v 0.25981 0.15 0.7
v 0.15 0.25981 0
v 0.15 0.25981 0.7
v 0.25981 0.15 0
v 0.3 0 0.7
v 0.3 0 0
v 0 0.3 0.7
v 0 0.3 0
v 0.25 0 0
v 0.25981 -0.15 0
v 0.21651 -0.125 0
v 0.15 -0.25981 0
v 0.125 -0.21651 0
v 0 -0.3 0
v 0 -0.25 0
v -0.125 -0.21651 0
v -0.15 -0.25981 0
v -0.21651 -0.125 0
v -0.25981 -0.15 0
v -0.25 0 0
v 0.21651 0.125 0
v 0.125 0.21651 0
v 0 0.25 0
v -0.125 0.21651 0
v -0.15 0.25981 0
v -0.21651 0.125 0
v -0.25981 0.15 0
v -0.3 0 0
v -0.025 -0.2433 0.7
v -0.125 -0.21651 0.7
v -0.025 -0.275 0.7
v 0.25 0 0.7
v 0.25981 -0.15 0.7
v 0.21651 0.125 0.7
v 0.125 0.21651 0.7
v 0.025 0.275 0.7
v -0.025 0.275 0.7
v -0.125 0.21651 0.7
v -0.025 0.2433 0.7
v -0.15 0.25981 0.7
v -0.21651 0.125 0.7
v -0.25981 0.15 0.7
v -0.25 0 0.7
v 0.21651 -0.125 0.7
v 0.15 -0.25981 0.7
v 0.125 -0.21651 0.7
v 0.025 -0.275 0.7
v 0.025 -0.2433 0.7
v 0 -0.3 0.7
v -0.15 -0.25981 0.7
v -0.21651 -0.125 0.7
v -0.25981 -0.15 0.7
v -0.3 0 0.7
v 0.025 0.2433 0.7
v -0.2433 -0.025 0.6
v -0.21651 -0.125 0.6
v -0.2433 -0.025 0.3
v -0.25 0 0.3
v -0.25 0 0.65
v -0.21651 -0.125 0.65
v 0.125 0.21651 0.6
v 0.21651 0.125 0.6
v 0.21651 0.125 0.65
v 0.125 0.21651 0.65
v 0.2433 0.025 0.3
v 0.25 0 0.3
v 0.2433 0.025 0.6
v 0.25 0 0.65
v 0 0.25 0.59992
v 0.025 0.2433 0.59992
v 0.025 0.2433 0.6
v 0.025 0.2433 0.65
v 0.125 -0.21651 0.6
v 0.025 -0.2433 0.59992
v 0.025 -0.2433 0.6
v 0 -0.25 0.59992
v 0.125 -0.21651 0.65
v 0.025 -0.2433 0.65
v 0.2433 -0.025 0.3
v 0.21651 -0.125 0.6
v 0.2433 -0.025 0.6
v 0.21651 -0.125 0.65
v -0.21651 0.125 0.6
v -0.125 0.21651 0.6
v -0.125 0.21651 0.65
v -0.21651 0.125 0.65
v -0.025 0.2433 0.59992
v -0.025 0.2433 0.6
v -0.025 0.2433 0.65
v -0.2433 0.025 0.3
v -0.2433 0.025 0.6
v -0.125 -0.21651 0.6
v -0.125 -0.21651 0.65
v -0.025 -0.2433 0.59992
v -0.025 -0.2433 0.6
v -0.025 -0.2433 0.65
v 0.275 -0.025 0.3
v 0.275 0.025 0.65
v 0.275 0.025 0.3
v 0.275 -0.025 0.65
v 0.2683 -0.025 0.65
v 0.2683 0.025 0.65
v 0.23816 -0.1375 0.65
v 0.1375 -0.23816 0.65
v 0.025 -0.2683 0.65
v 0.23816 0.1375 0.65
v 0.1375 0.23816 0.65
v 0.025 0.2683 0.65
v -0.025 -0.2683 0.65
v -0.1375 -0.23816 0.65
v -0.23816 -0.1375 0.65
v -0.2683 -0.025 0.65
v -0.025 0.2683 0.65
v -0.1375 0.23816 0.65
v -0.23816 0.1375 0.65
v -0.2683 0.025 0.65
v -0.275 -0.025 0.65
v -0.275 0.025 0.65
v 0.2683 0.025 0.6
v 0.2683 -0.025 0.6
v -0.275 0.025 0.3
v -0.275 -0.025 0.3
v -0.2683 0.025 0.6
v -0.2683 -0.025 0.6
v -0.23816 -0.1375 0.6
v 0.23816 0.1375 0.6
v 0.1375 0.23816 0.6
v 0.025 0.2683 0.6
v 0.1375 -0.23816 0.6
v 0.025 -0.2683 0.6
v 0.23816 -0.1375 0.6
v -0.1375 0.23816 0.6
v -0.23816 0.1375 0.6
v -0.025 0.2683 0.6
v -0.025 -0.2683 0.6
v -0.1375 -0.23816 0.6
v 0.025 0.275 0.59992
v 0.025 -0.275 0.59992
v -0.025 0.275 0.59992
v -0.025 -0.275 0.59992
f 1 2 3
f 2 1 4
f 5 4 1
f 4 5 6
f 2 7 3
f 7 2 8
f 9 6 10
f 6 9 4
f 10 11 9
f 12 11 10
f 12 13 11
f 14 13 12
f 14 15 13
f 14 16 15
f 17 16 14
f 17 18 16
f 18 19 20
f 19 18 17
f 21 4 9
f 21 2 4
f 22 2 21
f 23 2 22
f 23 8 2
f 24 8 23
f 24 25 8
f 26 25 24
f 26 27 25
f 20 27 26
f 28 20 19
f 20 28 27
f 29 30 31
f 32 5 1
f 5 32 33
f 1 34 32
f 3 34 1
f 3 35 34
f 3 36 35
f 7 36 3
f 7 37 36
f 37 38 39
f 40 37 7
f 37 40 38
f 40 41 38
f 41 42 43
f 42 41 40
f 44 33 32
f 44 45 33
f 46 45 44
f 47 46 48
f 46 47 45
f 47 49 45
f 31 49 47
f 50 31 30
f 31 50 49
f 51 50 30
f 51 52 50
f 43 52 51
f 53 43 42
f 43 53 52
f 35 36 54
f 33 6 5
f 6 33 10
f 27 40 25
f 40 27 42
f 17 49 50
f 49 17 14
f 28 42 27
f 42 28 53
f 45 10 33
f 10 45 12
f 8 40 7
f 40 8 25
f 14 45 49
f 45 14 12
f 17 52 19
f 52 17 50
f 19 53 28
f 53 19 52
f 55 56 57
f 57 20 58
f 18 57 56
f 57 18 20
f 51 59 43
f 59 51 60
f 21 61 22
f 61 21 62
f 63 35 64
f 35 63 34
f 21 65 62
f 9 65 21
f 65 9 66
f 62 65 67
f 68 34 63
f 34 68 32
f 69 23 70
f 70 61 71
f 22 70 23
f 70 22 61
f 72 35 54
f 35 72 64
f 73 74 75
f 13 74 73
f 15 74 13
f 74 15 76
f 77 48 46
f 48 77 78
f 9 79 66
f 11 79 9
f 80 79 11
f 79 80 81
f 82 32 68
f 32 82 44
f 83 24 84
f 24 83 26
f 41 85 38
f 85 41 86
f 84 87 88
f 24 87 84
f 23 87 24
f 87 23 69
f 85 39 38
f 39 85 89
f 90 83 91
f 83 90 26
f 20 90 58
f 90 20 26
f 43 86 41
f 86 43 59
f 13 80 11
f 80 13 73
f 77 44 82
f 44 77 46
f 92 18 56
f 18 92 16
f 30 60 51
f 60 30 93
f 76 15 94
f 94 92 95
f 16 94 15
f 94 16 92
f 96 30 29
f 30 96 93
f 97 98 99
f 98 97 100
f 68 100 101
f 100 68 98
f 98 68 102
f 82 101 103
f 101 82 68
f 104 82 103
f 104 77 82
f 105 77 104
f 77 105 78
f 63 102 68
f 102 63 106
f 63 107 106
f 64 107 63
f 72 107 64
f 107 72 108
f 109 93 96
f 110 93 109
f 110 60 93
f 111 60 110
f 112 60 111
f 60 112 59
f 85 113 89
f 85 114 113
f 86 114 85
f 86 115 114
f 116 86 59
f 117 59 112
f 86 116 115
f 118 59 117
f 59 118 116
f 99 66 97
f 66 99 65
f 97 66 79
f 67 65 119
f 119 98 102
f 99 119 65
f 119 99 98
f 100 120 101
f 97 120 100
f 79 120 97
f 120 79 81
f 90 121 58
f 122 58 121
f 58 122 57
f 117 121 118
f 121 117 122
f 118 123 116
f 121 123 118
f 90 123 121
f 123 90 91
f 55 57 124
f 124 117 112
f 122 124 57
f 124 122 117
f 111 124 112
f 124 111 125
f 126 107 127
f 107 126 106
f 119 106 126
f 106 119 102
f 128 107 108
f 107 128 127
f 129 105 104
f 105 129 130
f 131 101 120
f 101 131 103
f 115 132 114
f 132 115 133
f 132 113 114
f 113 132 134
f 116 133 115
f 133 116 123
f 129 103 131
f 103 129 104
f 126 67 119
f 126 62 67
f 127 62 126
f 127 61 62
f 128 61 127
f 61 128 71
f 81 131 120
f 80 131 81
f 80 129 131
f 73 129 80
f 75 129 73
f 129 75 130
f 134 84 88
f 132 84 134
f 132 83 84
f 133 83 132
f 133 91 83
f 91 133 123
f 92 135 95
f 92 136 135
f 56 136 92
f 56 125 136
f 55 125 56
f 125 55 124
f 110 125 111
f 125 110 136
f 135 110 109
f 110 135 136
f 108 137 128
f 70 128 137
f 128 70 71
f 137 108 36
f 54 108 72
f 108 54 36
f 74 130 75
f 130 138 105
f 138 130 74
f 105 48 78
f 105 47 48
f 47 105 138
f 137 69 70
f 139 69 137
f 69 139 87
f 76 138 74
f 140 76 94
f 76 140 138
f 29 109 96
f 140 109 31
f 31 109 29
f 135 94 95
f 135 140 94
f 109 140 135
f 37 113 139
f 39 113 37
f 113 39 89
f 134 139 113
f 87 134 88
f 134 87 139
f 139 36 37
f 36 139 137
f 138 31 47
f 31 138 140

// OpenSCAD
tolerance = 0.015;
hole_radius = 0.045;
grid_hole_radius = 0.03;
outer_radius = 0.3;
thickness = 0.05;
hole_attach_height = 0.02;
compressed_height = 0.7;
extended_height = 1;
next_hole_radius = 0.045;
next_hole_attach_height = 0.02;
next_inner = 0.2;
hole_twist = 0;

//other params
eps = tolerance/100;
rail_attach_height = grid_hole_radius + hole_attach_height;
inner_radius = outer_radius - thickness;
rail_attach_width = rail_attach_height;
fn = 12;
fnh = 6;

module angled_cylinder(angle_deg_y, _h, _r, angle_deg_x = 0) {
    rotate([angle_deg_x, angle_deg_y, 0]) { // Rotate the cylinder 
            cylinder(h = _h, r = _r, center = true, $fn = fnh);
        }
}

module hole(_h) {
    cylinder(h = _h, r = grid_hole_radius, $fn = fnh);
}

//makes circle of holes
module circular_grid(_h, _r, _n) {
    for (i = [0:_n-1]) {
        angle = i * 360 / _n;
        x_pos = _r * cos(angle);
        y_pos = _r * sin(angle);
        translate([x_pos, y_pos, -eps]) {
            hole(_h);
        }
    }
}

//makes grid of holes
module hole_grid(hole_height, grid_h) {
    translate([0,0,hole_height]) {
        difference() {
            //cylinder
            cylinder(h = grid_h, r = (inner_radius + outer_radius)/2, 
                center=false, $fn = fn);
            //holes
            for (i = [0 : grid_hole_radius * 2 + hole_attach_height : inner_radius - grid_hole_radius * 2]) {
                circular_grid(grid_h + eps*2, i, ceil(6.28*i/(grid_hole_radius*4)));
            }
            
        } 
    }
}

module bottom_joint() {
    out_hole_angle = 60;

    //grid of holes
    //hole_grid(hole_radius*2 + hole_attach_height * 2, grid_hole_radius);
   
    difference() {
        //outer cylinder
        cylinder(h=compressed_height, r= outer_radius, $fn = fn);
        
        //shell
        translate([0,0,-eps/2])
        cylinder(h=compressed_height + eps, r= inner_radius, $fn = fn);
        
        //screw holes
//        translate([0,0,hole_attach_height + hole_radius]) 
//        rotate([0,0,hole_twist]){
//            rotate([90,0,0])
//            cylinder(h=outer_radius*2 + eps,r=hole_radius,$fn=fnh,center=true);
//            rotate([0,90,0])
//            cylinder(h=outer_radius*2 + eps,r=hole_radius,$fn=fnh,center=true);
//            
//            
//        }
        
        //space between guide holes and grid
        guide_hole_space = grid_hole_radius;
        //guide holes
//        translate([-grid_hole_radius*cos(out_hole_angle) + inner_radius,0,hole_attach_height*2 + hole_radius*2 + grid_hole_radius + grid_hole_radius*sin(out_hole_angle) + guide_hole_space])
//                rotate([0,out_hole_angle,0])
//                cylinder(h=thickness/sin(out_hole_angle) + grid_hole_radius*2/tan(out_hole_angle), r=grid_hole_radius, $fn = fnh);
//        
//        translate([grid_hole_radius*cos(out_hole_angle) - inner_radius,0,hole_attach_height*2 + hole_radius*2 + grid_hole_radius + grid_hole_radius*sin(out_hole_angle) + guide_hole_space])
//                rotate([0,-out_hole_angle,0])
//                cylinder(h=thickness/sin(out_hole_angle) + grid_hole_radius*2/tan(out_hole_angle), r=grid_hole_radius, $fn = fnh);
        
        //for future reference of minimum joint size
        guide_height = hole_attach_height*2 + hole_radius*2 + grid_hole_radius + grid_hole_radius*2/sin(out_hole_angle) + thickness/tan(out_hole_angle) + guide_hole_space;
        
        //track
        rail_height = rail_attach_height + extended_height - compressed_height;
        translate([inner_radius,0,compressed_height - rail_height/2 - rail_attach_height])
            cube([thickness,rail_attach_width,rail_height],center = true);
        
        translate([-inner_radius,0,compressed_height - rail_height/2 - rail_attach_height])
            cube([thickness,rail_attach_width,rail_height],center = true);
        
        translate([0,0,compressed_height - rail_attach_height*2])
        cylinder(h=rail_attach_height,r=inner_radius + thickness/2,$fn=fn);
        
        //insert to track
        translate([0,0,compressed_height - rail_attach_height])
        cube([rail_attach_width, inner_radius*2 + thickness, rail_attach_height*2 + eps],center=true);
        
        //groove for string to slide through
//        translate([0,0,compressed_height])
//        rotate([0,90,0])
//        cylinder(h=outer_radius*2 + eps, r=grid_hole_radius,center=true, $fn=fnh);
    }
    
}

bottom_joint();
